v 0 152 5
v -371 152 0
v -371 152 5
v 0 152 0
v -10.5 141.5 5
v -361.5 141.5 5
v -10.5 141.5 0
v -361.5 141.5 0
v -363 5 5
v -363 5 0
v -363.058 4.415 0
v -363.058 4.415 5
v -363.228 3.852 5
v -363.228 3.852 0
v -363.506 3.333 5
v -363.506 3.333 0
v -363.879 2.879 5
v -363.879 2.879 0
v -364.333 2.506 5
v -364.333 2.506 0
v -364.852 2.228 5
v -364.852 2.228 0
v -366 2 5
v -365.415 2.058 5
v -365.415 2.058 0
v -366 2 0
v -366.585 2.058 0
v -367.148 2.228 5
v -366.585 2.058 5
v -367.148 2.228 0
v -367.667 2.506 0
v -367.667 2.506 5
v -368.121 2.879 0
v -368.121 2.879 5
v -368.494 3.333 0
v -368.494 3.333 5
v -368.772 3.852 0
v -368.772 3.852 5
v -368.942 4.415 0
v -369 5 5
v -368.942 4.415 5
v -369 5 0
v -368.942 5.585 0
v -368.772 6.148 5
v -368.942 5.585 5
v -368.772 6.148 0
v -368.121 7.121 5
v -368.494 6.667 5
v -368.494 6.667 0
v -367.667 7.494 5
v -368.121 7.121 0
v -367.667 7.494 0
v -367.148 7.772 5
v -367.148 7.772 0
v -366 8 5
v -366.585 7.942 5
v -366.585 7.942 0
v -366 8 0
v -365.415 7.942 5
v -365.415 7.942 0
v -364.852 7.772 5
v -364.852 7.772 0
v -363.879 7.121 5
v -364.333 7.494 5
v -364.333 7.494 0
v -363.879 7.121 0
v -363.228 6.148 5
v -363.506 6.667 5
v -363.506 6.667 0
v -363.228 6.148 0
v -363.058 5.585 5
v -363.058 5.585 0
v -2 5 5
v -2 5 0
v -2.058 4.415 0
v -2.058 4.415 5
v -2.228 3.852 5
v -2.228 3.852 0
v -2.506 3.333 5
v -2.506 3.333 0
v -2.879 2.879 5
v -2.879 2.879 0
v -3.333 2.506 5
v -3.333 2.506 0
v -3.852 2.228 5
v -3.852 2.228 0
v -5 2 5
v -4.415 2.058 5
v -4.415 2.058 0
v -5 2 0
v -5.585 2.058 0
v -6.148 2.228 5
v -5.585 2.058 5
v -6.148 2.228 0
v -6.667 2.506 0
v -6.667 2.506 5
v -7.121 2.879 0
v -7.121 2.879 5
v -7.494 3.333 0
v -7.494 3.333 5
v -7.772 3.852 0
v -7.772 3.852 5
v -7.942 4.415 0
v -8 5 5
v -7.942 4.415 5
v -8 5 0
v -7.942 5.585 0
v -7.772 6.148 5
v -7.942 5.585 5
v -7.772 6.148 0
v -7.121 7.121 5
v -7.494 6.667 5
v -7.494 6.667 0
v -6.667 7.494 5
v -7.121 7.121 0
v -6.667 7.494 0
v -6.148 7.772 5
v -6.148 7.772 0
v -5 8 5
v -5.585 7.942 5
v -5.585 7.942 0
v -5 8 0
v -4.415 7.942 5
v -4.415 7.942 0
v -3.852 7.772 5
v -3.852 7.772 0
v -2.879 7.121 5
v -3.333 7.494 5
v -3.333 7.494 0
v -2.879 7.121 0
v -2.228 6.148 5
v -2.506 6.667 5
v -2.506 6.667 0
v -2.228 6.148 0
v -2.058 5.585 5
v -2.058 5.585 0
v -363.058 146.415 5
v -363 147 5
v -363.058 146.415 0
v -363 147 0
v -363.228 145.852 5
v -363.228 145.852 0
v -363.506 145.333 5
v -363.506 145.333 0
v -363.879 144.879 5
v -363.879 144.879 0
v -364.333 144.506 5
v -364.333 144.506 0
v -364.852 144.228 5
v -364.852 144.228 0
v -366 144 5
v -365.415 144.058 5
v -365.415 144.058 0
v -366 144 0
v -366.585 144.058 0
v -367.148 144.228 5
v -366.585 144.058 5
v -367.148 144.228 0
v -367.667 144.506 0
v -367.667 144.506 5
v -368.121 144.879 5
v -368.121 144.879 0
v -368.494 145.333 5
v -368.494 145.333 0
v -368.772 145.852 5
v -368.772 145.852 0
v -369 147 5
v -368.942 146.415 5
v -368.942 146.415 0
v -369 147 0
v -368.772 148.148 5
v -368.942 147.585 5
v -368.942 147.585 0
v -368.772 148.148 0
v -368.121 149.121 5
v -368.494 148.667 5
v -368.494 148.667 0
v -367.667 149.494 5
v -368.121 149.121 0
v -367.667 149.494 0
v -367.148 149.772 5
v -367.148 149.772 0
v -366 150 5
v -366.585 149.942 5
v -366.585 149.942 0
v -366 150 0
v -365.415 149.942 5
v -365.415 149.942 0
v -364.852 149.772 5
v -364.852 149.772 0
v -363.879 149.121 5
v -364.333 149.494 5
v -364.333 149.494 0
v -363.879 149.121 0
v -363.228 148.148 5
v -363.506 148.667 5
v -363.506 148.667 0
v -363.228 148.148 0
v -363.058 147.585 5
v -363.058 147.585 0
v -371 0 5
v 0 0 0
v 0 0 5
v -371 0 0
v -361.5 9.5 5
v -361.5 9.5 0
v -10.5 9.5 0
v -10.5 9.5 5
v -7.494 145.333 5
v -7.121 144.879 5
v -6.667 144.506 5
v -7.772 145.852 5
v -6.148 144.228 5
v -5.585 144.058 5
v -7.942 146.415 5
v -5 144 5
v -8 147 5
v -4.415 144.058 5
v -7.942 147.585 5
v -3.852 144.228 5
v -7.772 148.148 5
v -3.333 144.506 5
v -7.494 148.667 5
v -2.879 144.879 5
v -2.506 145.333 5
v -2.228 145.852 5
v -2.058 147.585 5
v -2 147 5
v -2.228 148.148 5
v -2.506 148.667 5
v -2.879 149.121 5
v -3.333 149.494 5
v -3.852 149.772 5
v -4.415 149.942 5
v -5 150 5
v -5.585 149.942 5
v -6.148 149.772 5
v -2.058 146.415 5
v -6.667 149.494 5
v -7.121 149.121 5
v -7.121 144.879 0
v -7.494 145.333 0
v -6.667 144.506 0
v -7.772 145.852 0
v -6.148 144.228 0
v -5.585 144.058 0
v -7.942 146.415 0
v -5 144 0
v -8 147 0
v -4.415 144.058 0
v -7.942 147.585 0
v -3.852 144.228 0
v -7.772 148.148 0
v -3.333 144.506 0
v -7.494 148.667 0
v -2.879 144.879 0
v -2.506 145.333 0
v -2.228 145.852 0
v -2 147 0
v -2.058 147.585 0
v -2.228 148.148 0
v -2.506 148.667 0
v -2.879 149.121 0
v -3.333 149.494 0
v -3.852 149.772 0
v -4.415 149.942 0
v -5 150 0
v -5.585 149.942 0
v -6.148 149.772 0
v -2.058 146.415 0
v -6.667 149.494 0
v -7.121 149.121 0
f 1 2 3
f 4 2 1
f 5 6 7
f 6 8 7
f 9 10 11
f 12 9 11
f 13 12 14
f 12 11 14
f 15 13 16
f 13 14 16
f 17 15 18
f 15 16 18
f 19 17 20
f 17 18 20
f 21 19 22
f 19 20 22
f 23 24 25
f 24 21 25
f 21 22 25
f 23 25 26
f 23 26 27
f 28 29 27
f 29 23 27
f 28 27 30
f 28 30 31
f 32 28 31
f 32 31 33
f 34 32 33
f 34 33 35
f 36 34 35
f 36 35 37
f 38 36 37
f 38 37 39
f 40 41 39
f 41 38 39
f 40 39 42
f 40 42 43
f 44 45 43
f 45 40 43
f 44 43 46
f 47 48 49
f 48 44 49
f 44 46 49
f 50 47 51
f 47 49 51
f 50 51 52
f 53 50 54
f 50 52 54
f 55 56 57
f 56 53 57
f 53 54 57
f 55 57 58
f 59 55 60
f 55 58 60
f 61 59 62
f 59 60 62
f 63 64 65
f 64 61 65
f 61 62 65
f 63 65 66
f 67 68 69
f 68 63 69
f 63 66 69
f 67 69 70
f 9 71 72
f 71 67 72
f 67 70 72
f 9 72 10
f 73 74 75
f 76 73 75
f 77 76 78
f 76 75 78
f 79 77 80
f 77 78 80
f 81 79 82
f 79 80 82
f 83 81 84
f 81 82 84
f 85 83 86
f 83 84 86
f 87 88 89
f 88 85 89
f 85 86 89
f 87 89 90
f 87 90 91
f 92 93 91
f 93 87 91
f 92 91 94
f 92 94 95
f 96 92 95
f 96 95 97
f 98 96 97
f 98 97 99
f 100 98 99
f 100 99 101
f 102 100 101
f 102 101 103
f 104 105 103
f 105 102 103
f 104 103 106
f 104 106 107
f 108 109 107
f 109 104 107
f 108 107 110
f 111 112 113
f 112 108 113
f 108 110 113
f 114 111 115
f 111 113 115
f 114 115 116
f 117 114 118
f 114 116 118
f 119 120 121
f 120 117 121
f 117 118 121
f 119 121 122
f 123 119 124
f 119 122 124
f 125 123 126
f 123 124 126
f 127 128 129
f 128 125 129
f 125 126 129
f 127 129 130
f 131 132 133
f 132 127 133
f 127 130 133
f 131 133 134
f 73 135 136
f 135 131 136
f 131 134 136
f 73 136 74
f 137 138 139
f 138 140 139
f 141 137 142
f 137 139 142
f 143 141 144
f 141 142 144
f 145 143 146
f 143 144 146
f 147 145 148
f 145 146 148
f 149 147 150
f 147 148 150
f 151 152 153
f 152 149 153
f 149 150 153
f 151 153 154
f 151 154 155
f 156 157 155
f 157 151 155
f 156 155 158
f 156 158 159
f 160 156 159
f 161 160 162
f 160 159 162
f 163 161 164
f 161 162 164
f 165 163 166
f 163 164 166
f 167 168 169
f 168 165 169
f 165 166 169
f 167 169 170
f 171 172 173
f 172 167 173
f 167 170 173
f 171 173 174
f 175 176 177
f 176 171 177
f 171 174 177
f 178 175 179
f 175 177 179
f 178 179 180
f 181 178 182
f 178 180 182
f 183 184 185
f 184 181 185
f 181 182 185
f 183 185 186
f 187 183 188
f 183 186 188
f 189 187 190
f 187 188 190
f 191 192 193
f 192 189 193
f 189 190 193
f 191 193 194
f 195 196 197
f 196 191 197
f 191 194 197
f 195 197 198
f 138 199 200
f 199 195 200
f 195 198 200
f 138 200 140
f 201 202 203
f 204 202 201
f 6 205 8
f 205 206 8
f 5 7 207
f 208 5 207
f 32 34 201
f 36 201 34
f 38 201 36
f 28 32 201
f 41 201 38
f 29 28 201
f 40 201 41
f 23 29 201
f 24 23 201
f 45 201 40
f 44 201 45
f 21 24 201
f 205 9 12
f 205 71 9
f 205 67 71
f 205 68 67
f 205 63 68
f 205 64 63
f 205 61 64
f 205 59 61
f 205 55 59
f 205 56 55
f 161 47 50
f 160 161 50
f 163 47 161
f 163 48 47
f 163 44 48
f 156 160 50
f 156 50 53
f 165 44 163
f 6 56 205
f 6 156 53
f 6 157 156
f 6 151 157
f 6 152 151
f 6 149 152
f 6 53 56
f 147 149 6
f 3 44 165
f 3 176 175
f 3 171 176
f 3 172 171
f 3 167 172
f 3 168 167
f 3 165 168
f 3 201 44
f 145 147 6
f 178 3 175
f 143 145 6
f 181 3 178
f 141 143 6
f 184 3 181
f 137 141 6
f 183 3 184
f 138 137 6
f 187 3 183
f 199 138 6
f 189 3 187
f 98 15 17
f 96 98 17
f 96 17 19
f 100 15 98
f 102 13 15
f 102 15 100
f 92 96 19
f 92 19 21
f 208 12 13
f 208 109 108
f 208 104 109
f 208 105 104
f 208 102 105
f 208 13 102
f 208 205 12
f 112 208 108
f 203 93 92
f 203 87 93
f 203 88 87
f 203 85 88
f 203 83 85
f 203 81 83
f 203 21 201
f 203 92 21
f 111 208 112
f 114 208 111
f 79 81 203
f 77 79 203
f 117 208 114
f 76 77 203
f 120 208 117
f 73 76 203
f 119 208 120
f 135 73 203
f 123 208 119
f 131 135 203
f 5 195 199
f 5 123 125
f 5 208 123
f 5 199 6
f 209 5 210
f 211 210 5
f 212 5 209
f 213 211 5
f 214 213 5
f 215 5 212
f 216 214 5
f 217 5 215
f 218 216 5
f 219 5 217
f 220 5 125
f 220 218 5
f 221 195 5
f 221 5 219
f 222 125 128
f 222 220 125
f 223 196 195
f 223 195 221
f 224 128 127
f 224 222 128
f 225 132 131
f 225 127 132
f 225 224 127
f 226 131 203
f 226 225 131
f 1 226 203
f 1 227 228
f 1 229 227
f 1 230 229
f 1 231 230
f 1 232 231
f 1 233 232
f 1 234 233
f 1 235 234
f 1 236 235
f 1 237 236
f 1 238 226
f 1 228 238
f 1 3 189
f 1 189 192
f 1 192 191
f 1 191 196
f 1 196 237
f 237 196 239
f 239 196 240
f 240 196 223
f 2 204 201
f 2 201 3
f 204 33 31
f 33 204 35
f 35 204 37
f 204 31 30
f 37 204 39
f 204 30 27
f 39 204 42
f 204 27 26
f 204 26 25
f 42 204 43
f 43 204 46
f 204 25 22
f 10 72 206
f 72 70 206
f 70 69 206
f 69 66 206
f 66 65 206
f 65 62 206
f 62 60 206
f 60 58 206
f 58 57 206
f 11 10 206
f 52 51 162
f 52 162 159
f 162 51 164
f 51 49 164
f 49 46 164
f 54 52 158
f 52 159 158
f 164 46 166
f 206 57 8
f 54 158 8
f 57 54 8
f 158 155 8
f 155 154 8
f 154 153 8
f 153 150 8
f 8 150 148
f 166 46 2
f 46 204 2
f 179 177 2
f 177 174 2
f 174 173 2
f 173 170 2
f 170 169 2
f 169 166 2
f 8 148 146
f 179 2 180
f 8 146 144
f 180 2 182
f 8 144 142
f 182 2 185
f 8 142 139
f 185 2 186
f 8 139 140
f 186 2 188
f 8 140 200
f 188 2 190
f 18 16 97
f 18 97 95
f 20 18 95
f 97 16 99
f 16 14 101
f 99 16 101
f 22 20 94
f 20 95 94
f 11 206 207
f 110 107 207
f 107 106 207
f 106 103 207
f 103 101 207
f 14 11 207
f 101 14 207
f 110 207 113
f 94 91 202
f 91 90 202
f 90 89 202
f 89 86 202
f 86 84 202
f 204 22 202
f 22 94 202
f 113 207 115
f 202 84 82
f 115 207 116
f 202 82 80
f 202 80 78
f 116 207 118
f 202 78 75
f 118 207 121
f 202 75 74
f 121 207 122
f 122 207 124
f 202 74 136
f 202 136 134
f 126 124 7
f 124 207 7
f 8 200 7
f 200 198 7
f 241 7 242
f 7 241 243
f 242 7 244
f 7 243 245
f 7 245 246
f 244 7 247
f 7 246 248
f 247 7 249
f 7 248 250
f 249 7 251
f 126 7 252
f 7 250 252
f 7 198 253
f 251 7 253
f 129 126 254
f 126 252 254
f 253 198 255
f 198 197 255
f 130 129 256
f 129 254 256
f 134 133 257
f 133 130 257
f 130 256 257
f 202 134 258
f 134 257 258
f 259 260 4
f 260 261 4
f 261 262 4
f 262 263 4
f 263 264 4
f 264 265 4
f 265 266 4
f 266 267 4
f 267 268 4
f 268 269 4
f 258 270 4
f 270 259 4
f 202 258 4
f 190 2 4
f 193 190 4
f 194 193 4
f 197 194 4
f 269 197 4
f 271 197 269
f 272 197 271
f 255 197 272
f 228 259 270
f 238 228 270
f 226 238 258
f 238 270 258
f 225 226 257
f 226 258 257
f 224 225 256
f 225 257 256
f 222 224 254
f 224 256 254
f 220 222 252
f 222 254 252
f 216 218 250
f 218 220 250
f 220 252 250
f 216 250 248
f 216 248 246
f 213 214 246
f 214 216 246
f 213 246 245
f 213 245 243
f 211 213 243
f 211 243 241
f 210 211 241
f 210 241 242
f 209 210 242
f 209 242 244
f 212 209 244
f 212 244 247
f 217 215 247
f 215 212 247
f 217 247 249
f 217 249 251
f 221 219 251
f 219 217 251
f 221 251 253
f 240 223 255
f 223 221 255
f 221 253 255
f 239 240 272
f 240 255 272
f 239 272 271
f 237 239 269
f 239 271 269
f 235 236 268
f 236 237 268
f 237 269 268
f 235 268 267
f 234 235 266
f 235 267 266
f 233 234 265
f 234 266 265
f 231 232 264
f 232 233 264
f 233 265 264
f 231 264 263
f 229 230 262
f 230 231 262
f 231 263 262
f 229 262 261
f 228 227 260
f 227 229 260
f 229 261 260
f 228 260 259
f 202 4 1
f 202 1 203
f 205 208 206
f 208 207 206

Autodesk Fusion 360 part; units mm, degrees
sketch "Sketch1" plane through (0, 0, 0) normal (0, 0, 1) x (1, 0, 0)
  line L0 (0, 0) -> (-371, 0)
  line L1 (-371, 0) -> (-371, 152)
  line L2 (-371, 152) -> (0, 152)
  line L3 (0, 152) -> (0, 0)
  circle A0 centre (-366, 147) radius 1.7
  circle A1 centre (-5, 5) radius 1.7
  circle A2 centre (-366, 5) radius 1.7
  circle A3 centre (-5, 147) radius 1.7
  circle A4 centre (-366, 147) radius 3
  circle A5 centre (-5, 5) radius 3
  circle A6 centre (-366, 5) radius 3
  circle A7 centre (-5, 147) radius 3
  dimension "d1" = 371
  dimension "d2" = 152
  dimension "d3" = 3.4
  dimension "d4" = 5
  dimension "d5" = 5
  dimension "d6" = 3.4
  dimension "d7" = 3.4
  dimension "d8" = 3.4
  dimension "d9" = 5
  dimension "d10" = 5
  dimension "d11" = 5
  dimension "d12" = 5
  dimension "d13" = 5
  dimension "d14" = 5
  dimension "d15" = 6
  dimension "d16" = 6
  dimension "d17" = 6
  dimension "d18" = 6
sketch "Sketch2" plane through (0, 0, 0) normal (0, 0, 1) x (1, 0, 0)
  line L0 (-361.5, 141.5) -> (-10.5, 141.5)
  line L1 (-10.5, 141.5) -> (-10.5, 9.5)
  line L2 (-10.5, 9.5) -> (-361.5, 9.5)
  line L3 (-361.5, 9.5) -> (-361.5, 141.5)
  line L4 (0, 0) -> (-371, 0)
  line L5 (-371, 0) -> (-371, 152)
  dimension "d19" = 351
  dimension "d20" = 132
  dimension "d21" = 9.5
  dimension "d22" = 9.5
extrude "Extrude1" add sketch "Sketch1" along normal blind 5 contours L0 L1 L2 L3
extrude "Extrude2" cut sketch "Sketch2" along normal blind 10
